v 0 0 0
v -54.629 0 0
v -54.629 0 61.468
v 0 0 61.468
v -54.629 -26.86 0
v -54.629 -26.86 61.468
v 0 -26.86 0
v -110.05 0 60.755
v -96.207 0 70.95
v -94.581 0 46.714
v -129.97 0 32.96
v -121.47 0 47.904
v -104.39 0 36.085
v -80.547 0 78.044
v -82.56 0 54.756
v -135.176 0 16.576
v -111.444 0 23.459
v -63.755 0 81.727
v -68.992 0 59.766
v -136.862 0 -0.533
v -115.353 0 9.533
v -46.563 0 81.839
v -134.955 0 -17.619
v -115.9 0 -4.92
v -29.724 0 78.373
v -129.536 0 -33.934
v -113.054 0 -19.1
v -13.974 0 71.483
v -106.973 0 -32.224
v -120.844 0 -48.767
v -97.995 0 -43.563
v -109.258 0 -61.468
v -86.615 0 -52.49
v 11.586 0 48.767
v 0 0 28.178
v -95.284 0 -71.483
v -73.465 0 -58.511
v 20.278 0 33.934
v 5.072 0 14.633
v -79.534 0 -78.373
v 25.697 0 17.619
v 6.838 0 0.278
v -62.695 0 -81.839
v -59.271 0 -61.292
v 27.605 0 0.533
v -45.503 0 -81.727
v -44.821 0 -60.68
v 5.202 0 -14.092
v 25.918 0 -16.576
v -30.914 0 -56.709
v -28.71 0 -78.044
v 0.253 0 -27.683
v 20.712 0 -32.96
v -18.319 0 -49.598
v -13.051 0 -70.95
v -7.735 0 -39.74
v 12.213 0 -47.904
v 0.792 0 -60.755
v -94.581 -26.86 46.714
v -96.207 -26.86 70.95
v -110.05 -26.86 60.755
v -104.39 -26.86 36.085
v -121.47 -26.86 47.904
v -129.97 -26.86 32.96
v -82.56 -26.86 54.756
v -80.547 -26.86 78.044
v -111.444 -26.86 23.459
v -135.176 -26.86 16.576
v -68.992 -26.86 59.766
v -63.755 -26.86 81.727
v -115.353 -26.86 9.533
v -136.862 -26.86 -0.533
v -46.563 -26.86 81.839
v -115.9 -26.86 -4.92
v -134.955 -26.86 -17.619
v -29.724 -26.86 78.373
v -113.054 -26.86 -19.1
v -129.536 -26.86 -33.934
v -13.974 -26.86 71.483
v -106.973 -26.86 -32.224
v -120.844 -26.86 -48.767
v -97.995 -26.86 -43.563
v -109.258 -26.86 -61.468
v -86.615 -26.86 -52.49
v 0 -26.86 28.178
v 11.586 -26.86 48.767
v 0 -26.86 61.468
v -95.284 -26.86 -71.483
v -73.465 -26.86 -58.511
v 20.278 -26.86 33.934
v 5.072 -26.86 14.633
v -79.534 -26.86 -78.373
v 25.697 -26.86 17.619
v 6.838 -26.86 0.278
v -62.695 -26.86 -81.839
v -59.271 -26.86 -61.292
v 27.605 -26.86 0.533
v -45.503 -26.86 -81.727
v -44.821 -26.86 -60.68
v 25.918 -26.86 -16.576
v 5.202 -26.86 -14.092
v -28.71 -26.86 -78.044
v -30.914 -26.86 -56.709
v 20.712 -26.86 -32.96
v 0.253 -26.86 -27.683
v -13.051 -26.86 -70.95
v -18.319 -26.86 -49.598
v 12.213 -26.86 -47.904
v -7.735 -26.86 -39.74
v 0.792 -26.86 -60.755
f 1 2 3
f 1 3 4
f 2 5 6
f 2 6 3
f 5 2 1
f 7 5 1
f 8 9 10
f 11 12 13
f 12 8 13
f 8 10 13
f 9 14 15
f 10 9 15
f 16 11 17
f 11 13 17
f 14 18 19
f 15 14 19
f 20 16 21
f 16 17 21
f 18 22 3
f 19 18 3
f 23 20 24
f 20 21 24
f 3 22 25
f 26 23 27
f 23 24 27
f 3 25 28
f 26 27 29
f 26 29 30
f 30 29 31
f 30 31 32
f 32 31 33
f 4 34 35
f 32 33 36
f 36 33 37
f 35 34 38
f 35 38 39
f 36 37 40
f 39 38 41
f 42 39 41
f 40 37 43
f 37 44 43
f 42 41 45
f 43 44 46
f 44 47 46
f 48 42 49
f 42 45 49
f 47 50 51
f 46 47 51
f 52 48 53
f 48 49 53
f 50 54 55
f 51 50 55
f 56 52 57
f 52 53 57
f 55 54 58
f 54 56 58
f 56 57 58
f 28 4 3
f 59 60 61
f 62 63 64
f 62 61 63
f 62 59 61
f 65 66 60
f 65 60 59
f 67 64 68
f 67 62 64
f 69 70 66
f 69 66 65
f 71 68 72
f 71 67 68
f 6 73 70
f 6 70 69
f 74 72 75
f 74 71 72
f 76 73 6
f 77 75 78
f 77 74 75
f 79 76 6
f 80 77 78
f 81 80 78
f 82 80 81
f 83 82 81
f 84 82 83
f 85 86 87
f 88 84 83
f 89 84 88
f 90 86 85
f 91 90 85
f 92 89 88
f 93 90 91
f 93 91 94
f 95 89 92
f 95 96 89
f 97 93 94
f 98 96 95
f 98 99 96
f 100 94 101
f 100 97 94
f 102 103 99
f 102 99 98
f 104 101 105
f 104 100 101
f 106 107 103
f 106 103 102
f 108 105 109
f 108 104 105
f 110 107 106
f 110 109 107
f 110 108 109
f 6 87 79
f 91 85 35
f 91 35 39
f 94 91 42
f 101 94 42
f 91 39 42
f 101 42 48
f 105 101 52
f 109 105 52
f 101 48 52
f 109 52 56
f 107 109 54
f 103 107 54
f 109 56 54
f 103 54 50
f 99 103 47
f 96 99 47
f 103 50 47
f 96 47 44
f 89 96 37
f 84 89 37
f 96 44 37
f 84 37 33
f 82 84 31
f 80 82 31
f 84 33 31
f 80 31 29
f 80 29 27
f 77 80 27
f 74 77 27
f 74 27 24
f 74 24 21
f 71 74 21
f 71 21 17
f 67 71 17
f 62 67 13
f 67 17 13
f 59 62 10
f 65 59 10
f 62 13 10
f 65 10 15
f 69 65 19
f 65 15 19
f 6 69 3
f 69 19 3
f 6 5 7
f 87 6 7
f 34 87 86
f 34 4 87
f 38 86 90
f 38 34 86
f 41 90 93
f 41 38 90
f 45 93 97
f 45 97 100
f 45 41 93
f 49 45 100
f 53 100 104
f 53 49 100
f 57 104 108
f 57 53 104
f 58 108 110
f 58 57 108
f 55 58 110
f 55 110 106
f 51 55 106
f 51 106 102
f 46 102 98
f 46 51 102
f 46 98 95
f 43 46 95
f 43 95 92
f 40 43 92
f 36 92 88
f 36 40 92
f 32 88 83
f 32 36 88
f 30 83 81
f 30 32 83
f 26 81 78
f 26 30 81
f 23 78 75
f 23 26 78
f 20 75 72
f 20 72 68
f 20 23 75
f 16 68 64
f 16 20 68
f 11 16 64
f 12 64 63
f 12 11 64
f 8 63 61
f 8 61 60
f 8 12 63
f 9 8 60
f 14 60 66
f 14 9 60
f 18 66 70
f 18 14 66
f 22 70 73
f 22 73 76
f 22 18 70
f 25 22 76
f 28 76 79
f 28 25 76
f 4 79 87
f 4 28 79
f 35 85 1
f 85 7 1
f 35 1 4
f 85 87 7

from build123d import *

# Parameters (mm, degrees)
F0_W      = 54.628875
F0_H      = 26.859861
F1_DEPTH  = 61.468
F1_FACE_W = 54.628876
F1_FACE_H = 26.85986


with BuildPart() as f1:
    # F0 (on Top) → F1 (new body)
    with BuildSketch(Plane.XY):
        with Locations((-27.314438, -13.42993)):
            Rectangle(F0_W, F0_H)
    extrude(amount=F1_DEPTH)

    # F1_face (on face) → F2 (revolve)
    with BuildSketch(Plane(origin=(-27.314438, -13.42993, 61.468), x_dir=(1, 0, 0), z_dir=(0, 0, 1))):
        Rectangle(F1_FACE_W, F1_FACE_H)
    revolve(axis=Axis((-54.628875, -13.42993, 0), (0, 1, 0)))


solid = f1.part
